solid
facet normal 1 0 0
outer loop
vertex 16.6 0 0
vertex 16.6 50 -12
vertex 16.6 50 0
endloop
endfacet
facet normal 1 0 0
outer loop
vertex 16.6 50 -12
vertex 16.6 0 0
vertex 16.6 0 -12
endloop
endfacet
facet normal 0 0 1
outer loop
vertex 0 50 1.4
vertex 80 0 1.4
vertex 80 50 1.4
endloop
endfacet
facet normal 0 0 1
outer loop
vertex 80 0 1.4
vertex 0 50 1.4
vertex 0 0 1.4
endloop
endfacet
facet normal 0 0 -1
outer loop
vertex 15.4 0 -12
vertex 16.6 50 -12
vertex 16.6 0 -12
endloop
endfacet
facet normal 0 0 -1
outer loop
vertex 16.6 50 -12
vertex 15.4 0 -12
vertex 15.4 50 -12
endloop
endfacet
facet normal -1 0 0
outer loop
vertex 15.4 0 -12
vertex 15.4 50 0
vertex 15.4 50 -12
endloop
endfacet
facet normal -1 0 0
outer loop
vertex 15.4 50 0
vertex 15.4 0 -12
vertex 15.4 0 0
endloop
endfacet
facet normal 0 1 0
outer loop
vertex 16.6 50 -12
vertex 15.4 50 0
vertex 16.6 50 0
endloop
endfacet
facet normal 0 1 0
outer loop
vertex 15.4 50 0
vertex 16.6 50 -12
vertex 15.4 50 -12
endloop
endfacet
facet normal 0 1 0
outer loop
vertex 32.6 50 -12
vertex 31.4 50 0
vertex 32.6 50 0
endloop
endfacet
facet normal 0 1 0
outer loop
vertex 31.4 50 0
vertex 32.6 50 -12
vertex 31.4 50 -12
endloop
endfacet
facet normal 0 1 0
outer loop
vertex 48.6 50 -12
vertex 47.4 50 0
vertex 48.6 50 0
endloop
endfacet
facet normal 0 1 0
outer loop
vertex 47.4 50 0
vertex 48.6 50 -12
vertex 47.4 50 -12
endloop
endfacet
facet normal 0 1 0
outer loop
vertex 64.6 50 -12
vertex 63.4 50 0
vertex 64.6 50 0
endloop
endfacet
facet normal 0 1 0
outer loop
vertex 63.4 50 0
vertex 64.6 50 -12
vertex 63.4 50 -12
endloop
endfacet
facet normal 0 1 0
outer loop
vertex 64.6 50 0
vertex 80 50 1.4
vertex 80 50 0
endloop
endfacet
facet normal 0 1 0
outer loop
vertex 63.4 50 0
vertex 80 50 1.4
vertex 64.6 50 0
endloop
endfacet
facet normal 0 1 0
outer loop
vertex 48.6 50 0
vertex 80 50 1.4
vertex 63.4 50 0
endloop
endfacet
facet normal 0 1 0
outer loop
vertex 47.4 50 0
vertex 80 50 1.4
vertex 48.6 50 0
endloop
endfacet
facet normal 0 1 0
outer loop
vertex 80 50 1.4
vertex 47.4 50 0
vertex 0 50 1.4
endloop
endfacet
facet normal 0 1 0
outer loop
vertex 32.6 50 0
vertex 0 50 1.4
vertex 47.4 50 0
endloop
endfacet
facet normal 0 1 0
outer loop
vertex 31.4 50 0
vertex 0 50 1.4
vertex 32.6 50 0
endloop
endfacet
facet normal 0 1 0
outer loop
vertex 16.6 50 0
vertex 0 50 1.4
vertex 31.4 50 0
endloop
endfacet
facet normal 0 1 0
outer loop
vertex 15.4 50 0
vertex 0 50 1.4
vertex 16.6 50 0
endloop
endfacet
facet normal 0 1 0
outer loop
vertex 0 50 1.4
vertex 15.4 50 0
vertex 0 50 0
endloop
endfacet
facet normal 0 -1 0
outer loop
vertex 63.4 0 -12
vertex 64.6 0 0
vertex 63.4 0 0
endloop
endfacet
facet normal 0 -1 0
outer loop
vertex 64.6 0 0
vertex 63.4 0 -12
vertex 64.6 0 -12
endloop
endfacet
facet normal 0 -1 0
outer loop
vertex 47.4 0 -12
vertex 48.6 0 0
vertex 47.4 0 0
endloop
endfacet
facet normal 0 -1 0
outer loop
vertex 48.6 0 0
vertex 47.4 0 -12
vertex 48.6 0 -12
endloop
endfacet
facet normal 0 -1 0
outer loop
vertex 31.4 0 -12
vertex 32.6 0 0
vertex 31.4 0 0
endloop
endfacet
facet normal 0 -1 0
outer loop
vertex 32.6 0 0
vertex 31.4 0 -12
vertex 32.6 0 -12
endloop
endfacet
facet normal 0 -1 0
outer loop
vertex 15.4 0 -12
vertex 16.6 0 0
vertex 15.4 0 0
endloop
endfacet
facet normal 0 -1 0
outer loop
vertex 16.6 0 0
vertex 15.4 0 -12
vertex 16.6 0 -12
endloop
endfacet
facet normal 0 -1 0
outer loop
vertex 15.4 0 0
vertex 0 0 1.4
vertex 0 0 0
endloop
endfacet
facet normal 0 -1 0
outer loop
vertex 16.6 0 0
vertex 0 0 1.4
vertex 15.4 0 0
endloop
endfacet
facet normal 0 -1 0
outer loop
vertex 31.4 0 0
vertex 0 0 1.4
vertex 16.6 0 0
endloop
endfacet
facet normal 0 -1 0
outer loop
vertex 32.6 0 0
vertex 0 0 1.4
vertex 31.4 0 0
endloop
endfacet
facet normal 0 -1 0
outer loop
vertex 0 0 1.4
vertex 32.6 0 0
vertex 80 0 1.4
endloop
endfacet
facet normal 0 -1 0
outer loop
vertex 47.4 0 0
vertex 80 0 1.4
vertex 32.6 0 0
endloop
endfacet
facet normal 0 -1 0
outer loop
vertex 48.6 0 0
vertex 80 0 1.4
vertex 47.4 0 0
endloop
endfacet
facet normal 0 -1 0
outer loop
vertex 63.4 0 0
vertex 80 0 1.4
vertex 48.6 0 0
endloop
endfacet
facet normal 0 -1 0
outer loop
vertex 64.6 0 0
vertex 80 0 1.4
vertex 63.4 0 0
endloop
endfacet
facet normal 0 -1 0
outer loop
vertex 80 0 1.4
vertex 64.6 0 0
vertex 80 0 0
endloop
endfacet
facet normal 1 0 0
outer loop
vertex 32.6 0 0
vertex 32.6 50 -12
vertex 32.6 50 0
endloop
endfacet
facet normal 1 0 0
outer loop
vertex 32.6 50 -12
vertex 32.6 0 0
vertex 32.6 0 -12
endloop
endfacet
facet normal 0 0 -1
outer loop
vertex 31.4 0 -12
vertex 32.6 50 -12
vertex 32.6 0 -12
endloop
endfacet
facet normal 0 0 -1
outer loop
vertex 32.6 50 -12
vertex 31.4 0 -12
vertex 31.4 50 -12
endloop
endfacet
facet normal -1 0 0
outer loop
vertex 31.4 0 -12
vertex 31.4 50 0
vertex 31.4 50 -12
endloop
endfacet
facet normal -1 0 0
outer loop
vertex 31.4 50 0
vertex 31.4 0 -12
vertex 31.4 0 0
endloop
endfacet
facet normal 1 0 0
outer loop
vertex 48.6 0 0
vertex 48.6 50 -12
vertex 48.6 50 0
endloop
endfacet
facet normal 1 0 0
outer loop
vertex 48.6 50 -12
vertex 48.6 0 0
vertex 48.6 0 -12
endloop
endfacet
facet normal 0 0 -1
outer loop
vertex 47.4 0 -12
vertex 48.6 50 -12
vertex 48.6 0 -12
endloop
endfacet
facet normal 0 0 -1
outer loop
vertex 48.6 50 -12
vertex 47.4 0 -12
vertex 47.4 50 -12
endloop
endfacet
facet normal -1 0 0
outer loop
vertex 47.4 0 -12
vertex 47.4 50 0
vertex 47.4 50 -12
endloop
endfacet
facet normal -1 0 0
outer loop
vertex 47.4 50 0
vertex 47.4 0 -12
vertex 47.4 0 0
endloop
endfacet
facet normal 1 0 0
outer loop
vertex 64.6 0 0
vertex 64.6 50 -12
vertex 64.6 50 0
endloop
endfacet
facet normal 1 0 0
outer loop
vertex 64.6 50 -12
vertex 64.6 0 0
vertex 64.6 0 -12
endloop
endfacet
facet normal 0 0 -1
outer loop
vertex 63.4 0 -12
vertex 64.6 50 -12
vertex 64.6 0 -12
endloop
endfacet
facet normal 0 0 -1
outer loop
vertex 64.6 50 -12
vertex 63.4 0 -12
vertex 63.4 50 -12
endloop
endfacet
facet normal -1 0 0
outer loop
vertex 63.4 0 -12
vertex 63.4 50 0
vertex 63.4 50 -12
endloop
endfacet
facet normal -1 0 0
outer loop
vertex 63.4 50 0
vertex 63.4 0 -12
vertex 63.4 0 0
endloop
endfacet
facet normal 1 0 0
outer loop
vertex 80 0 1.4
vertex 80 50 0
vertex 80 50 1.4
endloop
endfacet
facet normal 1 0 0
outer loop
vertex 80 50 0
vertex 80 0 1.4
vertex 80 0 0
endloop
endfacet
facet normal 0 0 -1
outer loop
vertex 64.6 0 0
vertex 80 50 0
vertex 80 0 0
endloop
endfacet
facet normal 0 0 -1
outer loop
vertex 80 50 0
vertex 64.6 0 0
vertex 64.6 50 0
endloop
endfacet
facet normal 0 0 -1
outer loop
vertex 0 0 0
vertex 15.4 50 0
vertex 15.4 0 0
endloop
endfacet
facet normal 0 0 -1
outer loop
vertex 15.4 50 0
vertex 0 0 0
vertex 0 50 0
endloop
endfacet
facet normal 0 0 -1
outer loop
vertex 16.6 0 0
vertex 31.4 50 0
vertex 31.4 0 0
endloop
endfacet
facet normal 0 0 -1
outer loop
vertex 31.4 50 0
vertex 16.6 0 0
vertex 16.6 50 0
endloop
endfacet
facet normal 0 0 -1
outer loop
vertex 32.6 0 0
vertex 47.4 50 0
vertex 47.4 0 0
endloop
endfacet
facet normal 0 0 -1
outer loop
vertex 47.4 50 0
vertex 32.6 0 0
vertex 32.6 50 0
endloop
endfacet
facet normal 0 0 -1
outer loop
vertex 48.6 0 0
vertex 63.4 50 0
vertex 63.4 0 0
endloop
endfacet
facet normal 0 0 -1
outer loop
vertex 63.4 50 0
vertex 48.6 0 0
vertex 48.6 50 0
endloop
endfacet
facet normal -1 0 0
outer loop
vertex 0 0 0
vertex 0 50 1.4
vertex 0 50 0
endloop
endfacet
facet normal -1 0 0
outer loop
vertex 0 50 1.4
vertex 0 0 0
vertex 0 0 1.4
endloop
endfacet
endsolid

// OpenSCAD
$fn = 32;

// ----------------------------------------------------------------------
// Ribbed panel: 1.4 mm panel
// ----------------------------------------------------------------------

// --- parameters (mm) ---
panel_l = 80;             // panel length, X
panel_w = 50;             // panel width, Y
panel_t = 1.4;            // panel thickness, Z
rib_t = 1.2;              // rib thickness
rib_h = 12;               // rib height below the panel
ribs = 4;                 // number of ribs

total_h = panel_t + rib_h;  // overall height

union() {
  cube([panel_l, panel_w, panel_t]);
  for (i = [1 : ribs])
    translate([i * panel_l / (ribs + 1) - rib_t / 2, 0, -rib_h])
      cube([rib_t, panel_w, rib_h + panel_t]);
}
